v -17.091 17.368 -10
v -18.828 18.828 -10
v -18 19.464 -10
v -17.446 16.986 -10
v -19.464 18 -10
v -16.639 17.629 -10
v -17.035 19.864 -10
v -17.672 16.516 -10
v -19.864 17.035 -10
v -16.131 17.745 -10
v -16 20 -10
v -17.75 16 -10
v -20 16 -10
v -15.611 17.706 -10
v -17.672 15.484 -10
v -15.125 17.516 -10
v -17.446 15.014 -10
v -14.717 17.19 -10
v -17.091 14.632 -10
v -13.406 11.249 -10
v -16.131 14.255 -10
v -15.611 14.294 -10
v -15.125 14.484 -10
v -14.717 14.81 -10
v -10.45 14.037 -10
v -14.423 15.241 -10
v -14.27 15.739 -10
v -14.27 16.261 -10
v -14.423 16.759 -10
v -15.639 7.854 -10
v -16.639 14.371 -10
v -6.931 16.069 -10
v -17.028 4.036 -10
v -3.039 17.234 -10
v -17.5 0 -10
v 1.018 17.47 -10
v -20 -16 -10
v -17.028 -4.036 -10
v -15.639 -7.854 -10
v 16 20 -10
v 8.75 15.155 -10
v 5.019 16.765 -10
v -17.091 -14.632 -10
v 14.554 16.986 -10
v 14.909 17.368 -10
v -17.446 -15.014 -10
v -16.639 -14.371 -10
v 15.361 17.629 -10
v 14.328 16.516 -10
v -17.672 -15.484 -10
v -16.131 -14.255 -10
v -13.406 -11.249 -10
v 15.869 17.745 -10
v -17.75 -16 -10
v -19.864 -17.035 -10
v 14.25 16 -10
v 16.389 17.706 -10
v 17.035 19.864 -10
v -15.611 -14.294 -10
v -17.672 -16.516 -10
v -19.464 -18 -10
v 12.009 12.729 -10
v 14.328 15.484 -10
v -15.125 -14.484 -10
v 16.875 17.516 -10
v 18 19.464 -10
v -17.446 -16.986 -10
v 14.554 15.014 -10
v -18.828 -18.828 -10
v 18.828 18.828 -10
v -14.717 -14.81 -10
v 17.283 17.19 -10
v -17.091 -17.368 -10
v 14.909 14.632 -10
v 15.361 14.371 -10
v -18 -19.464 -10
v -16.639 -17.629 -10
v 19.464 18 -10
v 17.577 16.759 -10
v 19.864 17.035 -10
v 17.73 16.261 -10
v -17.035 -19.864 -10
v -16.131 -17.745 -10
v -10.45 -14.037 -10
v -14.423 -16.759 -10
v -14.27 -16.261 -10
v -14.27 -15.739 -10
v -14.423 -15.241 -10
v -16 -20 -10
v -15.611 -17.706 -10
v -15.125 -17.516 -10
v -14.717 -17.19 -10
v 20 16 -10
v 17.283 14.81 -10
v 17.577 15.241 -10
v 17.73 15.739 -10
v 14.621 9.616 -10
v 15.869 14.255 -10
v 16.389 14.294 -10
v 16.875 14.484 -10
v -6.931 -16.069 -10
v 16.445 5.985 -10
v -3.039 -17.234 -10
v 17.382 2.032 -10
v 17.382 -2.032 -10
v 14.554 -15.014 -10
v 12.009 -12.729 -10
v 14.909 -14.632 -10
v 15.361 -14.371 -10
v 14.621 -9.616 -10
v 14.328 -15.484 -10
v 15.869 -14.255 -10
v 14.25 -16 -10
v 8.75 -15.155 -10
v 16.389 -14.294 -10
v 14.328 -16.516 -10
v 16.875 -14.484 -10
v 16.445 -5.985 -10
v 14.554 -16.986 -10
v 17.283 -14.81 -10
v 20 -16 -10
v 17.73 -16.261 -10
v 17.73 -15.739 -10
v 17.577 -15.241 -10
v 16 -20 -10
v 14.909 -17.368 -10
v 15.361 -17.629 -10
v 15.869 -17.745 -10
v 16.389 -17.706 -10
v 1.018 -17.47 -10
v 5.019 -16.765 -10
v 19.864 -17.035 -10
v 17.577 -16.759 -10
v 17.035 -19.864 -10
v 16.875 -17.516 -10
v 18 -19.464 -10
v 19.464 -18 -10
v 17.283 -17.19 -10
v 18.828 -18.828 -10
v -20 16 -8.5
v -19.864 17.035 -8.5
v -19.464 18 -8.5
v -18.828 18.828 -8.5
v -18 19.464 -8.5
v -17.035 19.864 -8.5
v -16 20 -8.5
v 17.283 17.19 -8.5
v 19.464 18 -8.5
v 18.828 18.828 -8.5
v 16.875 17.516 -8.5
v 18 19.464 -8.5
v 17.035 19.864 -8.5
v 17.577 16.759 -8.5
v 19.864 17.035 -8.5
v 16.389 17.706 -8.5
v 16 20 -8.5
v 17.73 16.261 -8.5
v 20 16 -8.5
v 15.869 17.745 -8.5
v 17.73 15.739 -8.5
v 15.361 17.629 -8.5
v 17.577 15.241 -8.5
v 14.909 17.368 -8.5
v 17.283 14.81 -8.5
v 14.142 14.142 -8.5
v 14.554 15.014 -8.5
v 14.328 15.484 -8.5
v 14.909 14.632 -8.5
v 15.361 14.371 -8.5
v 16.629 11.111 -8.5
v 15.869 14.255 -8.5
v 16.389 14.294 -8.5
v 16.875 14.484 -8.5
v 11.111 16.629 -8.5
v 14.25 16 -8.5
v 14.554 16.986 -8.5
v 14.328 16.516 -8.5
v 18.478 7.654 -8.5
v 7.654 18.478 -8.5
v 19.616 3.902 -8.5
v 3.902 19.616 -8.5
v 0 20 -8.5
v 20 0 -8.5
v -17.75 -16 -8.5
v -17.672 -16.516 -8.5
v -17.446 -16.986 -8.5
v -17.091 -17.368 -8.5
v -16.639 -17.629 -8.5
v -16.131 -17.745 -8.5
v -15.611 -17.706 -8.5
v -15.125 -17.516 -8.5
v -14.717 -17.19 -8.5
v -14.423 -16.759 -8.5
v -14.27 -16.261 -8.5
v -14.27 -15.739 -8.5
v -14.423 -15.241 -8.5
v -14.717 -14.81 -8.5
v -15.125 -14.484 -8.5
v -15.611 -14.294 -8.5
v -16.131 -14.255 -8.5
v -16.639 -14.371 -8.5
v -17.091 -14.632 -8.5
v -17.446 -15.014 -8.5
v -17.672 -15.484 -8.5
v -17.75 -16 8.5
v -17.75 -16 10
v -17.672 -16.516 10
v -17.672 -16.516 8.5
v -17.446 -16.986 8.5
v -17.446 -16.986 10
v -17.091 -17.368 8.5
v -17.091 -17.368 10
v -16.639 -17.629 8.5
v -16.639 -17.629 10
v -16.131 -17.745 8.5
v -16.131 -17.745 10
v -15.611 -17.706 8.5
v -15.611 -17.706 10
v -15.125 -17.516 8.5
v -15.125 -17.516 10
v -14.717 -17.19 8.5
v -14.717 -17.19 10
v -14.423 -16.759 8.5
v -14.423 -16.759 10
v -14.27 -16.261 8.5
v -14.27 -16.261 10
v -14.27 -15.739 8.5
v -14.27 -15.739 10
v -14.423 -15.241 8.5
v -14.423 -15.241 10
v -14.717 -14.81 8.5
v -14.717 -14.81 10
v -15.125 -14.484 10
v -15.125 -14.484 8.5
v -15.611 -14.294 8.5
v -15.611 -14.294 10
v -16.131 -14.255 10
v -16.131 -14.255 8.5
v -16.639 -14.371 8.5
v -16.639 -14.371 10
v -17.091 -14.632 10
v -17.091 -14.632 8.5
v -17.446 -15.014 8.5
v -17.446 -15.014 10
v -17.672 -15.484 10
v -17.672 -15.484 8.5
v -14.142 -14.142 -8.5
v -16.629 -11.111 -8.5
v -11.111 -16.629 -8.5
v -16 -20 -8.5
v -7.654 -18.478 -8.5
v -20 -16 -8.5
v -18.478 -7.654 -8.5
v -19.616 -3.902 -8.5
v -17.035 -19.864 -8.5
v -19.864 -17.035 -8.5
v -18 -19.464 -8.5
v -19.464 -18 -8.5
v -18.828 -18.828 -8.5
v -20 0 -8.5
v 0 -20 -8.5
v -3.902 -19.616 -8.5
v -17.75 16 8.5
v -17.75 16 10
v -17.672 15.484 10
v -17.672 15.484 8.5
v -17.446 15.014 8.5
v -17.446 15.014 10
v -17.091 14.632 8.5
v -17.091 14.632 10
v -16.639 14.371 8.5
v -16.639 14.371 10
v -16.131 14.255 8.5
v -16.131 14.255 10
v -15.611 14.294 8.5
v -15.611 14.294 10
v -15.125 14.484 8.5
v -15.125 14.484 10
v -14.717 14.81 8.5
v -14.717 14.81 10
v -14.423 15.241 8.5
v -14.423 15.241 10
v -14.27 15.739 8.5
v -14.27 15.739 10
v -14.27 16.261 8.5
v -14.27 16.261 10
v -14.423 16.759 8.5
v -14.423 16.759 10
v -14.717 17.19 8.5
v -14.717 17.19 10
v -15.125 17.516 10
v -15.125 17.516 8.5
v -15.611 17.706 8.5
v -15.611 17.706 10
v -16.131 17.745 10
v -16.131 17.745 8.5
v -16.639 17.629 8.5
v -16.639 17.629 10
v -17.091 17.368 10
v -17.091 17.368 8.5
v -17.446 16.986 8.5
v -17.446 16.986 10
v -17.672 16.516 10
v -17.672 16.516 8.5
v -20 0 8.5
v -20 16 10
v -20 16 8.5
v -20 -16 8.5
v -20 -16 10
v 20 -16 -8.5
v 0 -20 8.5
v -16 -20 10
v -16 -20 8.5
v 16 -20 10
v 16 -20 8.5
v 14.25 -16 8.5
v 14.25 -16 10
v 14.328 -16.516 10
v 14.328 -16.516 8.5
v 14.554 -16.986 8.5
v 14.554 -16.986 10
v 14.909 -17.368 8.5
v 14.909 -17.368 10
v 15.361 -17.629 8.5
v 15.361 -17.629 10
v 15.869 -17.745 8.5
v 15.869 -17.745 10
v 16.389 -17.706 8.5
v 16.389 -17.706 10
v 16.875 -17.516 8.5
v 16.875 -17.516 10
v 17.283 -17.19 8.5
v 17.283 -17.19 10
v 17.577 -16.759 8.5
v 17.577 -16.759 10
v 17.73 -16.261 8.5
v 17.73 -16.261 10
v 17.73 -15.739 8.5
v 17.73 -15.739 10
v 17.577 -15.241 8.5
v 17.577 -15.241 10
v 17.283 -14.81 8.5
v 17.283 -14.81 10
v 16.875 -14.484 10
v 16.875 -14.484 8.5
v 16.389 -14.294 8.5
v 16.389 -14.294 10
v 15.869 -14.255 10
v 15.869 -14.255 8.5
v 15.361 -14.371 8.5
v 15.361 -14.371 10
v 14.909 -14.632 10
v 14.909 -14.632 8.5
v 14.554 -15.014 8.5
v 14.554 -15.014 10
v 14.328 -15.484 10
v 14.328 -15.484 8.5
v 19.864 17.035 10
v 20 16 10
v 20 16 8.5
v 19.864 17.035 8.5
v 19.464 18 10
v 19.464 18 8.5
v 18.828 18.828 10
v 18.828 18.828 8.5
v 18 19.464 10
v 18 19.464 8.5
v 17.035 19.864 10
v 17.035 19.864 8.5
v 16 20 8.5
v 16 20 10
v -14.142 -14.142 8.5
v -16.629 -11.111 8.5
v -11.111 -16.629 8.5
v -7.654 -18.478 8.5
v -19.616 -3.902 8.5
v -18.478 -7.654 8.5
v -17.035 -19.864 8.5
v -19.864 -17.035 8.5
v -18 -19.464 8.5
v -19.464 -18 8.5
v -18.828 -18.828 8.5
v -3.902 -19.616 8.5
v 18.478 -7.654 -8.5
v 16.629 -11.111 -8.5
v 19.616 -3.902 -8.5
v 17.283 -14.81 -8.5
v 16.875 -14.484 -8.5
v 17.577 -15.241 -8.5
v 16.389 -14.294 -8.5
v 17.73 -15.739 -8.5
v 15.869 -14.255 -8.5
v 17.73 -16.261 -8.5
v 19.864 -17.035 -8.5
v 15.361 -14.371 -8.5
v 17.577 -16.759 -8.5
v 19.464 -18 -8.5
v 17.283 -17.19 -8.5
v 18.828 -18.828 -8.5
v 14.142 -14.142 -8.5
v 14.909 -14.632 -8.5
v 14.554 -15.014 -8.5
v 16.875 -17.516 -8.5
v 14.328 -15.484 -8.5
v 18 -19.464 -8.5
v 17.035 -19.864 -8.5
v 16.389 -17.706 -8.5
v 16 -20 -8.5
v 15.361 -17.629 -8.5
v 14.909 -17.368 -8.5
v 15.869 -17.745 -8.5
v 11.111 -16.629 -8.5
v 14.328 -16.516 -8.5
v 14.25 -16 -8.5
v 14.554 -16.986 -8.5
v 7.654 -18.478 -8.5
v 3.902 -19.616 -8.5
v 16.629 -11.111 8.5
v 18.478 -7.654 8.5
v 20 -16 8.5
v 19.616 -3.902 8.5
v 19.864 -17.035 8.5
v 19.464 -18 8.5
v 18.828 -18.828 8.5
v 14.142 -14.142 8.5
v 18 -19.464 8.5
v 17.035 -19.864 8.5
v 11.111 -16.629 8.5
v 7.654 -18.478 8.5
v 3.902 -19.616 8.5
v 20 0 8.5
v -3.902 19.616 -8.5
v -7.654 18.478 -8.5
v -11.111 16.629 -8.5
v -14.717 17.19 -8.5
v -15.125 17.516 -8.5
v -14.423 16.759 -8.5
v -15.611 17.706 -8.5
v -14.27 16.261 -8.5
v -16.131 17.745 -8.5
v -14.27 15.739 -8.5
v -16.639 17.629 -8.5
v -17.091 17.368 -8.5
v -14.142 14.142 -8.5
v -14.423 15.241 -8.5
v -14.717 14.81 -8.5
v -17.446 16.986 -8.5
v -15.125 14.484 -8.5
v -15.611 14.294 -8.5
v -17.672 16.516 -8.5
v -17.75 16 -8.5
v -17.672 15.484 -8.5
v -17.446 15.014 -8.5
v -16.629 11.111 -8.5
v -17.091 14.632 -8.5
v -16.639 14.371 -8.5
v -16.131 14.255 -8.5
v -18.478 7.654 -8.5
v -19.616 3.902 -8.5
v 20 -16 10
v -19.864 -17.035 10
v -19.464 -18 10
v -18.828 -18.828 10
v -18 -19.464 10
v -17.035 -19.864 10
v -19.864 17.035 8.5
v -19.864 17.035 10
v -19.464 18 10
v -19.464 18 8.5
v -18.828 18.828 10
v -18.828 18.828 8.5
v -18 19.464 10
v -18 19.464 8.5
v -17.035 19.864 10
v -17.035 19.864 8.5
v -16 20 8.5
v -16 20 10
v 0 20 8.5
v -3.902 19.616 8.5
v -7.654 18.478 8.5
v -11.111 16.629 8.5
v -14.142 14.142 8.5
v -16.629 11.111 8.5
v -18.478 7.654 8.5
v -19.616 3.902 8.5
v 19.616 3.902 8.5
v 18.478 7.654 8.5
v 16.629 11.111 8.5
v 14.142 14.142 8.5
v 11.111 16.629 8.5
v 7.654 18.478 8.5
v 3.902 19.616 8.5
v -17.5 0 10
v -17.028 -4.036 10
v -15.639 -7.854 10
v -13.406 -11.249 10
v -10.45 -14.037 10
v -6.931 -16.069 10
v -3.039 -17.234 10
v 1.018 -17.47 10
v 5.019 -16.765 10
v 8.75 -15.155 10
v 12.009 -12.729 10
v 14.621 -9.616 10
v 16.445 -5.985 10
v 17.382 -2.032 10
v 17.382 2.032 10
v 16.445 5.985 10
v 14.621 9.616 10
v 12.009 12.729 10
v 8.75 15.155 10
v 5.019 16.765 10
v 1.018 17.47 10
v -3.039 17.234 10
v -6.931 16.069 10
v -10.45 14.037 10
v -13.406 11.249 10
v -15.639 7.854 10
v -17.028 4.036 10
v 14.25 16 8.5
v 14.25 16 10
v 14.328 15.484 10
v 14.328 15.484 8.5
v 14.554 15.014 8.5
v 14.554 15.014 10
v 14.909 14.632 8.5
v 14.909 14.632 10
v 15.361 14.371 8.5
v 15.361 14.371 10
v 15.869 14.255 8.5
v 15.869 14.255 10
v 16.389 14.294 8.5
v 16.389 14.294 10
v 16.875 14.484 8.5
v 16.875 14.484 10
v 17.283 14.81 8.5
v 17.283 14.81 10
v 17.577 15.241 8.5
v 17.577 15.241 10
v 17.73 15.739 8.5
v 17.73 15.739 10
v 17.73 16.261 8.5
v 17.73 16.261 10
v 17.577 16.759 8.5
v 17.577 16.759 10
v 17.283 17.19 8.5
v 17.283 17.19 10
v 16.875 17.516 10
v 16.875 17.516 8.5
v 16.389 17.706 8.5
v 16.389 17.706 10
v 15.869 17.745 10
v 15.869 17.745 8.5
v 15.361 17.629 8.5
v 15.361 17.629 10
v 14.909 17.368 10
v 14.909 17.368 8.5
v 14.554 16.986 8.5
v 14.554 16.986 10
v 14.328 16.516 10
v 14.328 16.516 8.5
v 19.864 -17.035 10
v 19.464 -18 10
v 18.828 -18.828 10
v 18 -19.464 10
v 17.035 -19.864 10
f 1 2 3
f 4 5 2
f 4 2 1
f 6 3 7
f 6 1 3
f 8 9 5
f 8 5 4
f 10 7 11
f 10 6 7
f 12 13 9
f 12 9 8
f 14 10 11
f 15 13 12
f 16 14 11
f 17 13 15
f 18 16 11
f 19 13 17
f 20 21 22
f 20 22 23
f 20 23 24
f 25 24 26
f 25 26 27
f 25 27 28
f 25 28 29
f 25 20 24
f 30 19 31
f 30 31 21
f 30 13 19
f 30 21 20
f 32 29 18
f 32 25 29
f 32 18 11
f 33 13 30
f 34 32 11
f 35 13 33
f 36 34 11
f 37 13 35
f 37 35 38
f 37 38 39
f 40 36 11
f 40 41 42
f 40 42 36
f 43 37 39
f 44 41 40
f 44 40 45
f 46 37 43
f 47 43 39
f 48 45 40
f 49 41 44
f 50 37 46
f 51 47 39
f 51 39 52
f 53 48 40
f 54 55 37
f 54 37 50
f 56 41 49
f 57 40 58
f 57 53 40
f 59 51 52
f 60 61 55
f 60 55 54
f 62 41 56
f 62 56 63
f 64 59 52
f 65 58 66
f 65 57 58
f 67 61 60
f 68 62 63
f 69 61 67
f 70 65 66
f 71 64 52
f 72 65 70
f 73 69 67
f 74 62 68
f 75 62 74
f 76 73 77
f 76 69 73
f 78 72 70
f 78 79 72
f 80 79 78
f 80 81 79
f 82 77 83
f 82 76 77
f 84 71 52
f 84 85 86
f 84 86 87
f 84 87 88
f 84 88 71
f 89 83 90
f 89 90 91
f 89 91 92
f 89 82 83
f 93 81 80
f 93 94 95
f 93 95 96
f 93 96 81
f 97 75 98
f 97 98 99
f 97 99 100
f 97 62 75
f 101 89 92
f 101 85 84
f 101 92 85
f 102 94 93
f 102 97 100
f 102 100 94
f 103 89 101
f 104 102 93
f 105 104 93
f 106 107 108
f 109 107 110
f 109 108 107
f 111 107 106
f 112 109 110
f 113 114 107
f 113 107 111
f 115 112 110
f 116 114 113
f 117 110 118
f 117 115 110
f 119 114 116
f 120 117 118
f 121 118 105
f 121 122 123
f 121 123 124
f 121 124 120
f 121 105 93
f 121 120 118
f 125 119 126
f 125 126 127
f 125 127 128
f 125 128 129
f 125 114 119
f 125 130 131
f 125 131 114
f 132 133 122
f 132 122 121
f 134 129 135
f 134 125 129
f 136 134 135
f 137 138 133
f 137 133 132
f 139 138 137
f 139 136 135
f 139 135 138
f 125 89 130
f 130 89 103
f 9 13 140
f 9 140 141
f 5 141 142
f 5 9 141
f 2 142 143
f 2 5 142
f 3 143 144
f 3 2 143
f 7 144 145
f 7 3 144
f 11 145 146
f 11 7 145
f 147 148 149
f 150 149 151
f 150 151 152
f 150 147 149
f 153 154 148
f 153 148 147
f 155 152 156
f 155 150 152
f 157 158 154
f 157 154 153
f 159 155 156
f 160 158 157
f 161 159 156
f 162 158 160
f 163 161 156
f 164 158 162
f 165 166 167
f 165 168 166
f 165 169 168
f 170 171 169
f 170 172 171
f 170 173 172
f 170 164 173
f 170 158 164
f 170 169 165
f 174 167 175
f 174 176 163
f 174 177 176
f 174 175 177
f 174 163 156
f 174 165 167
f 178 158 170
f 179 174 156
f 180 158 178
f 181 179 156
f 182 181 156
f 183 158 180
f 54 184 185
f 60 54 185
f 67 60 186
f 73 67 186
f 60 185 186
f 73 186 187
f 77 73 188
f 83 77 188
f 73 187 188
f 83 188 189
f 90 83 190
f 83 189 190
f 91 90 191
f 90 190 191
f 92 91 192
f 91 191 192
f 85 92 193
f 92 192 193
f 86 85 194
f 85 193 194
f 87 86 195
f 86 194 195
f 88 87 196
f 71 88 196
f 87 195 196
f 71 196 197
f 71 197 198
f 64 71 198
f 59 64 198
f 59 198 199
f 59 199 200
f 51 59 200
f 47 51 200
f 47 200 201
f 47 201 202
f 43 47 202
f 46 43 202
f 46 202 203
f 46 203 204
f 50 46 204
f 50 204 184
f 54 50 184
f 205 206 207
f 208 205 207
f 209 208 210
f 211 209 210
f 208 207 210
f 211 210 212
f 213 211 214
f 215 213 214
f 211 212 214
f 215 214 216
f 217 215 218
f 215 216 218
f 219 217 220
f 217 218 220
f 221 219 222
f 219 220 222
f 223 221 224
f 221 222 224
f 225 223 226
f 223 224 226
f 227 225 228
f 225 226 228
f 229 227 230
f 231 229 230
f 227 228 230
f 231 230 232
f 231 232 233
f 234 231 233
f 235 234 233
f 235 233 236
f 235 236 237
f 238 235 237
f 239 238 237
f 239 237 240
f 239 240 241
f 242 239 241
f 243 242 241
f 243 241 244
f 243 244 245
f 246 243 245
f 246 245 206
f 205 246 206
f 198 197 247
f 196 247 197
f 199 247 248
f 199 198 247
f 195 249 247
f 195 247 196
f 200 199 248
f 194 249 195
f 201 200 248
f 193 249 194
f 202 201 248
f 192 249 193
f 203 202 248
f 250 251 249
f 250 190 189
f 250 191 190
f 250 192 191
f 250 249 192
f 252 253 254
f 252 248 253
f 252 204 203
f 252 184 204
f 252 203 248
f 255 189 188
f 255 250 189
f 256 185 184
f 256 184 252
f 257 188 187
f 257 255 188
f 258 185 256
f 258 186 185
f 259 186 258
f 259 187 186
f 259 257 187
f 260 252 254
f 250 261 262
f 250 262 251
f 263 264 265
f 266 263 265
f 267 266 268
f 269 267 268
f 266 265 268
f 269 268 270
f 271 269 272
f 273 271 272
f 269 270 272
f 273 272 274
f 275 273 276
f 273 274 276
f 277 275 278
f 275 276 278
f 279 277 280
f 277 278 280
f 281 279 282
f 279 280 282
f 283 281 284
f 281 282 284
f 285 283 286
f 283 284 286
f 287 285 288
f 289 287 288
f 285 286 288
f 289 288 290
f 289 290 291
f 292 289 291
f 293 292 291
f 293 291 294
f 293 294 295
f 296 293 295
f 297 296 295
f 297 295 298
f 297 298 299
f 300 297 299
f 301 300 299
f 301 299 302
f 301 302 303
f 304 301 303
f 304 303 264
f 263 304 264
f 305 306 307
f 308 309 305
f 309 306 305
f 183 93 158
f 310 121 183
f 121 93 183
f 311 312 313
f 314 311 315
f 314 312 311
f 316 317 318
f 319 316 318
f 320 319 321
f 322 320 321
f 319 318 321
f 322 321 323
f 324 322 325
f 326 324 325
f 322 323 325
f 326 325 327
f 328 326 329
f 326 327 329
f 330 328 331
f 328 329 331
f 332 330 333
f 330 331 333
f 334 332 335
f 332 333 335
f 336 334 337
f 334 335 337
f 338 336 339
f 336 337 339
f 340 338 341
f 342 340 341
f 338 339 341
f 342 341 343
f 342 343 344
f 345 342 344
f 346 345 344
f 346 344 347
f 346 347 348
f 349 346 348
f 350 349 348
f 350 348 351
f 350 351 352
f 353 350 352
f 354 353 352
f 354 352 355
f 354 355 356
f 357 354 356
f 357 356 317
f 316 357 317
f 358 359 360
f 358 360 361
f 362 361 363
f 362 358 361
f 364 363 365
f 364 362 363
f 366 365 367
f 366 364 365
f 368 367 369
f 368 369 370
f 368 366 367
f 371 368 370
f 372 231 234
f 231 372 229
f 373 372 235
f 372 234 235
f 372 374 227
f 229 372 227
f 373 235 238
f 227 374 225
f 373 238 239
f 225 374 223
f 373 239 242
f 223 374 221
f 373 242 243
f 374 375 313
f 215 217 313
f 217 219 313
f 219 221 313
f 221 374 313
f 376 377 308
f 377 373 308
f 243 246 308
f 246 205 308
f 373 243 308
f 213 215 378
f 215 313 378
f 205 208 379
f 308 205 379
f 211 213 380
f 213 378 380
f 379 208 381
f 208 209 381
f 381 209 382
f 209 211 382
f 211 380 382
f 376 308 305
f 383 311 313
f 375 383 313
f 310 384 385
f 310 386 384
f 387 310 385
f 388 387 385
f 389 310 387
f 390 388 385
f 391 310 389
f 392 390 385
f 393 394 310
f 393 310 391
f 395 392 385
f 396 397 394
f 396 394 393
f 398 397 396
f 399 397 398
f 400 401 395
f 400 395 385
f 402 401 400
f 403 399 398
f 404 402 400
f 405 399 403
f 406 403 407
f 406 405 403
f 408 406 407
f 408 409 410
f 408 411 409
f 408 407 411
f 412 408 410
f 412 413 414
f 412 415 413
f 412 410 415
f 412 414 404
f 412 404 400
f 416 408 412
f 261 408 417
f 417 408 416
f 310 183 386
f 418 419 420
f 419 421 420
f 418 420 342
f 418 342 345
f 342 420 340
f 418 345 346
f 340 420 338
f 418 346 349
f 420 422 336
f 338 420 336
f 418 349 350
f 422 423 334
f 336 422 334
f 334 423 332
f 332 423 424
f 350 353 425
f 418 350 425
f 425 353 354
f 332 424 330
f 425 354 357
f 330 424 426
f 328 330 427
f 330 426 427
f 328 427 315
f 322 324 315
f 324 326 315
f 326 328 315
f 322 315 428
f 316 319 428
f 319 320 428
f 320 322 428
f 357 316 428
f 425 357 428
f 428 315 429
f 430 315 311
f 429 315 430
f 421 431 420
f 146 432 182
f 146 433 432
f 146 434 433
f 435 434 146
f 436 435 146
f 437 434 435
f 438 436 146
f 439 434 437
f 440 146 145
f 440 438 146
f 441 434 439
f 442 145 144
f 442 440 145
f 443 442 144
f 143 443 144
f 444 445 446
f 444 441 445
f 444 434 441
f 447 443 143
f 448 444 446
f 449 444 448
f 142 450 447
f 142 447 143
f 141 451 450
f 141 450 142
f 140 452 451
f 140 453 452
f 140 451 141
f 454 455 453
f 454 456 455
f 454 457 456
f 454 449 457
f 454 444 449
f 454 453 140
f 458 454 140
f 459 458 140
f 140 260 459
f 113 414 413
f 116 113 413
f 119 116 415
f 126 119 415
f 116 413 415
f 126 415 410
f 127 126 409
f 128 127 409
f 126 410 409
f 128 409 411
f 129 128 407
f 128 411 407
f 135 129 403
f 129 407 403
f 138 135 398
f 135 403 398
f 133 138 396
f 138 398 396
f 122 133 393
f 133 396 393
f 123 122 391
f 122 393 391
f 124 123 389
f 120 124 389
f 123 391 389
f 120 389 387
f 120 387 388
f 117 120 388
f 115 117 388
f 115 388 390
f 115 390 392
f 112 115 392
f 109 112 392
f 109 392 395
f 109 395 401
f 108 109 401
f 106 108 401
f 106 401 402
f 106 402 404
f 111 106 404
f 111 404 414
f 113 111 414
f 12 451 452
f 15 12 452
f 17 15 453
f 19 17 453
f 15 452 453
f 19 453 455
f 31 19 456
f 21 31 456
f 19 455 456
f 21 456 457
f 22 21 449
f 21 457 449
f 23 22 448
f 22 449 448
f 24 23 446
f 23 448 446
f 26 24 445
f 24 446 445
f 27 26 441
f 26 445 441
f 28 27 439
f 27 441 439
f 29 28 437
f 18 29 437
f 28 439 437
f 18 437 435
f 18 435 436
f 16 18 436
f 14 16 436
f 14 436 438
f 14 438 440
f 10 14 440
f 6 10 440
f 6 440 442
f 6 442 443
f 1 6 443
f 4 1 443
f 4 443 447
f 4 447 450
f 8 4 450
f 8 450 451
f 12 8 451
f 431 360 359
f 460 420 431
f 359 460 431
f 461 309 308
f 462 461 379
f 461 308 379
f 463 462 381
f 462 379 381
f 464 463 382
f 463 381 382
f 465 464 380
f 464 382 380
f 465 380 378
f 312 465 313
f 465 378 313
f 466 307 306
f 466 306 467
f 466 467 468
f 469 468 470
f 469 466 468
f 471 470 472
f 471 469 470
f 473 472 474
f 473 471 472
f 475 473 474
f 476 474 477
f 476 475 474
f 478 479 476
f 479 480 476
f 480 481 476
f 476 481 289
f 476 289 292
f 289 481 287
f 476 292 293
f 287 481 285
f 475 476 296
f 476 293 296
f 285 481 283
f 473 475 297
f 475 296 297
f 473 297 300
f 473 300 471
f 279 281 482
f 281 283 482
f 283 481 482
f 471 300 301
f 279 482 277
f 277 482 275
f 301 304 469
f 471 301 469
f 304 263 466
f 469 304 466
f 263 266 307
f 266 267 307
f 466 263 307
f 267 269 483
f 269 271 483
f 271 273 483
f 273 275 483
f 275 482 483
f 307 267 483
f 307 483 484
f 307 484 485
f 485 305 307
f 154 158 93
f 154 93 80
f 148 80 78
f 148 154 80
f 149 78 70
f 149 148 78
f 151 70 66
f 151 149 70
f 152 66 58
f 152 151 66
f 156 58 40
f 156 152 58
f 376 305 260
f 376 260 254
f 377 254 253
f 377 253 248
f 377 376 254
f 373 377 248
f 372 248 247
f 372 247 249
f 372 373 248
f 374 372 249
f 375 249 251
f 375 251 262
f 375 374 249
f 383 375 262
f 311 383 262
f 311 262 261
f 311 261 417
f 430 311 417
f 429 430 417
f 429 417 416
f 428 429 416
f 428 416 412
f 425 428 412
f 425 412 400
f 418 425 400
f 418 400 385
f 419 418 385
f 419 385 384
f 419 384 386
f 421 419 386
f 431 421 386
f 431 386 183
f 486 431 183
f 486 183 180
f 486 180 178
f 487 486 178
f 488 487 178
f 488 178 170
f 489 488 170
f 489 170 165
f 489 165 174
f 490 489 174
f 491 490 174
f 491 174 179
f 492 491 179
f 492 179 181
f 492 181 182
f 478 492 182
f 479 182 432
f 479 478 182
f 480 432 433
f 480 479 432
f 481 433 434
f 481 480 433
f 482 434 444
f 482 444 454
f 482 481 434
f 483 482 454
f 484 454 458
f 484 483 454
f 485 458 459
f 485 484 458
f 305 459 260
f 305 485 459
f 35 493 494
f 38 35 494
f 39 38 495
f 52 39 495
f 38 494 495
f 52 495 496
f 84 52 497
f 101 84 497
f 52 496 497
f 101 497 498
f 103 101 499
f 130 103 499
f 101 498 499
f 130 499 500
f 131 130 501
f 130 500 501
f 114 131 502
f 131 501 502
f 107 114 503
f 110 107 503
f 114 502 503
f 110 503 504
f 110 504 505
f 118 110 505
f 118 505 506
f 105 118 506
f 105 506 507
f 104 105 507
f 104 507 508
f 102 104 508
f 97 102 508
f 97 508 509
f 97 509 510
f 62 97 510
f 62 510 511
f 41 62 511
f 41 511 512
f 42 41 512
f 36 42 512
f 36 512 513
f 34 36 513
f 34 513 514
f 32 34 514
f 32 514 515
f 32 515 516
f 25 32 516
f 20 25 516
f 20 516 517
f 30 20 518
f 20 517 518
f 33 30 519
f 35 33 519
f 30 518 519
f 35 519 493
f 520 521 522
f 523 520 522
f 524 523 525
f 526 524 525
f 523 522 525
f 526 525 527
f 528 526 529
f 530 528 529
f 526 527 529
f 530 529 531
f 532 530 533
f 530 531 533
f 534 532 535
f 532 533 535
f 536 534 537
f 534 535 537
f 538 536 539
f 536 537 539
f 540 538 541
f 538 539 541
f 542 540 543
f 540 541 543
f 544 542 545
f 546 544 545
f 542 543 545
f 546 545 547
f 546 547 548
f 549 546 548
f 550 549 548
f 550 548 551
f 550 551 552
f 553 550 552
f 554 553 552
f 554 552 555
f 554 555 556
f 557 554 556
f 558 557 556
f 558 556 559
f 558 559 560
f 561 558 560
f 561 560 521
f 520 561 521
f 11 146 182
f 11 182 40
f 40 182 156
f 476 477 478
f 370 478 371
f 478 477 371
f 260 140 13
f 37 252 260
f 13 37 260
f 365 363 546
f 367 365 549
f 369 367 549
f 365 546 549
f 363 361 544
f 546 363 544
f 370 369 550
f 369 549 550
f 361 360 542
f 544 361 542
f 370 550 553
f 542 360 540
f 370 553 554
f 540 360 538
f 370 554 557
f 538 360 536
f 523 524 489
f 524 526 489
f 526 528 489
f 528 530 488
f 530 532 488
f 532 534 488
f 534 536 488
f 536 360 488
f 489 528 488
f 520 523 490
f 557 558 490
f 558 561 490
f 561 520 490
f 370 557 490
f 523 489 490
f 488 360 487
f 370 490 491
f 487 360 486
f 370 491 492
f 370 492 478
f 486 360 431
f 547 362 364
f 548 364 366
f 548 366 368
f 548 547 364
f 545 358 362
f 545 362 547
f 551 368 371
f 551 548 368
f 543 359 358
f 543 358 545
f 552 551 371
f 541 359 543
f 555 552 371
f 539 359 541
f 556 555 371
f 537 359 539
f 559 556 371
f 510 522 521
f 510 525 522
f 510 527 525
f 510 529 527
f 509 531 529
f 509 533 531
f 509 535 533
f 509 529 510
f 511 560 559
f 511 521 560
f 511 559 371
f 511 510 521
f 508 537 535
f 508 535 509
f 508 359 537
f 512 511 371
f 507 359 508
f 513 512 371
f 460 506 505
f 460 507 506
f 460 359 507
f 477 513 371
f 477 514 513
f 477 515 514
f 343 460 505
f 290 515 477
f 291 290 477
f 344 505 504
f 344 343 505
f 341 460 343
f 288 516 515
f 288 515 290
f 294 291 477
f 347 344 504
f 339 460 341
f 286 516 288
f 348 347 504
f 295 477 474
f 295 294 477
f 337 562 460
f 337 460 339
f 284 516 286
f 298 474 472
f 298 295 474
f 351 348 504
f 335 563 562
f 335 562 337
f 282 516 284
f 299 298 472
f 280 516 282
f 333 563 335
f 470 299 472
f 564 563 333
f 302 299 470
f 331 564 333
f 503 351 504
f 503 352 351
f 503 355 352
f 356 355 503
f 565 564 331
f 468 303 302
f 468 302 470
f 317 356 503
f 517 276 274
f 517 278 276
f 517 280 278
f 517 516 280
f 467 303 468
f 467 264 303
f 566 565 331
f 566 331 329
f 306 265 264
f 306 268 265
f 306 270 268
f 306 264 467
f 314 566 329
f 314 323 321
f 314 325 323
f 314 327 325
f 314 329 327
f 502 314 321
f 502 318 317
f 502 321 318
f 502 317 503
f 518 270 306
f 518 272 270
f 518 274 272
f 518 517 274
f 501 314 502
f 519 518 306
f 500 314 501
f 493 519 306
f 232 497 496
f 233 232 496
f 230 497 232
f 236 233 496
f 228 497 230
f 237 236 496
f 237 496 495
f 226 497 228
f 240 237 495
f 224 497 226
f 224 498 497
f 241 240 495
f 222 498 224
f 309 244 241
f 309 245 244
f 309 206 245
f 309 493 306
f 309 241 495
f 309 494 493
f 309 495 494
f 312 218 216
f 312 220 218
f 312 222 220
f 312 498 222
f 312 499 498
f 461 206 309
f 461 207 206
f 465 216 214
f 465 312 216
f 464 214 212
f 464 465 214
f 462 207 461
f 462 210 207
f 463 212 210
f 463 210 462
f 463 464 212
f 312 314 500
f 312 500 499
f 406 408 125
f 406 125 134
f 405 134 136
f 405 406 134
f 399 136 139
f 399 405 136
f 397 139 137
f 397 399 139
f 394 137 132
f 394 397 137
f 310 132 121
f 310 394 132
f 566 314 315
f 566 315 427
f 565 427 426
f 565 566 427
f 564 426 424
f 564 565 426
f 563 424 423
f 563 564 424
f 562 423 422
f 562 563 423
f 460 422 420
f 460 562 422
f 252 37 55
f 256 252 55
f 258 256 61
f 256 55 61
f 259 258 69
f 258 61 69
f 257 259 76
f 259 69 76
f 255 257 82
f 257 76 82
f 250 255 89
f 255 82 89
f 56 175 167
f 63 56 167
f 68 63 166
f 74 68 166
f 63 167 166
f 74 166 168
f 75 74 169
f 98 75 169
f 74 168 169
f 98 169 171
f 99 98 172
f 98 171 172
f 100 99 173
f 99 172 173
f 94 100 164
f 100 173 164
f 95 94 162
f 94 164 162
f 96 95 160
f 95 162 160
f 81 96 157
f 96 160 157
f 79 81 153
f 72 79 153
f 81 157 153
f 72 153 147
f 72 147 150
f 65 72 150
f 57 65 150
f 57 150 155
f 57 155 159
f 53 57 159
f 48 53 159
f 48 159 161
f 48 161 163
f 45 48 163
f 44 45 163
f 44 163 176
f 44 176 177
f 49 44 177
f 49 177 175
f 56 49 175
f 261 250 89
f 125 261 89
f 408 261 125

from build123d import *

# Parameters (mm, degrees)
F0_W     = 1.5
F0_H     = 17
F1_DEPTH = 20
F2_R     = 4
F4_D     = 3.5
F0_W_2   = 22.978194
F6_D     = 35


with BuildPart() as f1:
    # F0 (on Front) → F1 (new body, symmetric)
    with BuildSketch(Plane.XZ):
        with Locations((-19.25, 0)):
            Rectangle(F0_W, F0_H)
        Polygon((0, 10), (-20, 10), (-20, 8.5), (-18.5, 8.5), (-18.5, -8.5), (-20, -8.5), (-20, -10), (20, -10), (20, 10), align=None)
    extrude(amount=F1_DEPTH, both=True)

    # F2
    f2_edges = [f1.edges().sort_by_distance(p)[0] for p in [
        (-20, -20, 0),
        (20, -20, 0),
        (20, 20, 0),
        (-20, 20, 0),
    ]]
    fillet(f2_edges, radius=F2_R)

    # F4 (through all)
    with Locations(Plane(origin=(0, 0, -10), x_dir=(1, 0, 0), z_dir=(0, 0, -1))):
        with Locations((-16, 16), (16, 16), (16, -16), (-16, -16)):
            Hole(F4_D / 2)

    # F0 (on Front) → F5 (revolve, cut)
    with BuildSketch(Plane.XZ):
        with Locations((-31.489097, 0)):
            Rectangle(F0_W_2, F0_H)
    revolve(axis=Axis((0, 0, 9.40158), (0, 0, 1)), mode=Mode.SUBTRACT)

    # F6 (through all)
    with Locations(Plane(origin=(0, 0, -10), x_dir=(1, 0, 0), z_dir=(0, 0, -1))):
        with Locations((0, 0)):
            Hole(F6_D / 2)


solid = f1.part
